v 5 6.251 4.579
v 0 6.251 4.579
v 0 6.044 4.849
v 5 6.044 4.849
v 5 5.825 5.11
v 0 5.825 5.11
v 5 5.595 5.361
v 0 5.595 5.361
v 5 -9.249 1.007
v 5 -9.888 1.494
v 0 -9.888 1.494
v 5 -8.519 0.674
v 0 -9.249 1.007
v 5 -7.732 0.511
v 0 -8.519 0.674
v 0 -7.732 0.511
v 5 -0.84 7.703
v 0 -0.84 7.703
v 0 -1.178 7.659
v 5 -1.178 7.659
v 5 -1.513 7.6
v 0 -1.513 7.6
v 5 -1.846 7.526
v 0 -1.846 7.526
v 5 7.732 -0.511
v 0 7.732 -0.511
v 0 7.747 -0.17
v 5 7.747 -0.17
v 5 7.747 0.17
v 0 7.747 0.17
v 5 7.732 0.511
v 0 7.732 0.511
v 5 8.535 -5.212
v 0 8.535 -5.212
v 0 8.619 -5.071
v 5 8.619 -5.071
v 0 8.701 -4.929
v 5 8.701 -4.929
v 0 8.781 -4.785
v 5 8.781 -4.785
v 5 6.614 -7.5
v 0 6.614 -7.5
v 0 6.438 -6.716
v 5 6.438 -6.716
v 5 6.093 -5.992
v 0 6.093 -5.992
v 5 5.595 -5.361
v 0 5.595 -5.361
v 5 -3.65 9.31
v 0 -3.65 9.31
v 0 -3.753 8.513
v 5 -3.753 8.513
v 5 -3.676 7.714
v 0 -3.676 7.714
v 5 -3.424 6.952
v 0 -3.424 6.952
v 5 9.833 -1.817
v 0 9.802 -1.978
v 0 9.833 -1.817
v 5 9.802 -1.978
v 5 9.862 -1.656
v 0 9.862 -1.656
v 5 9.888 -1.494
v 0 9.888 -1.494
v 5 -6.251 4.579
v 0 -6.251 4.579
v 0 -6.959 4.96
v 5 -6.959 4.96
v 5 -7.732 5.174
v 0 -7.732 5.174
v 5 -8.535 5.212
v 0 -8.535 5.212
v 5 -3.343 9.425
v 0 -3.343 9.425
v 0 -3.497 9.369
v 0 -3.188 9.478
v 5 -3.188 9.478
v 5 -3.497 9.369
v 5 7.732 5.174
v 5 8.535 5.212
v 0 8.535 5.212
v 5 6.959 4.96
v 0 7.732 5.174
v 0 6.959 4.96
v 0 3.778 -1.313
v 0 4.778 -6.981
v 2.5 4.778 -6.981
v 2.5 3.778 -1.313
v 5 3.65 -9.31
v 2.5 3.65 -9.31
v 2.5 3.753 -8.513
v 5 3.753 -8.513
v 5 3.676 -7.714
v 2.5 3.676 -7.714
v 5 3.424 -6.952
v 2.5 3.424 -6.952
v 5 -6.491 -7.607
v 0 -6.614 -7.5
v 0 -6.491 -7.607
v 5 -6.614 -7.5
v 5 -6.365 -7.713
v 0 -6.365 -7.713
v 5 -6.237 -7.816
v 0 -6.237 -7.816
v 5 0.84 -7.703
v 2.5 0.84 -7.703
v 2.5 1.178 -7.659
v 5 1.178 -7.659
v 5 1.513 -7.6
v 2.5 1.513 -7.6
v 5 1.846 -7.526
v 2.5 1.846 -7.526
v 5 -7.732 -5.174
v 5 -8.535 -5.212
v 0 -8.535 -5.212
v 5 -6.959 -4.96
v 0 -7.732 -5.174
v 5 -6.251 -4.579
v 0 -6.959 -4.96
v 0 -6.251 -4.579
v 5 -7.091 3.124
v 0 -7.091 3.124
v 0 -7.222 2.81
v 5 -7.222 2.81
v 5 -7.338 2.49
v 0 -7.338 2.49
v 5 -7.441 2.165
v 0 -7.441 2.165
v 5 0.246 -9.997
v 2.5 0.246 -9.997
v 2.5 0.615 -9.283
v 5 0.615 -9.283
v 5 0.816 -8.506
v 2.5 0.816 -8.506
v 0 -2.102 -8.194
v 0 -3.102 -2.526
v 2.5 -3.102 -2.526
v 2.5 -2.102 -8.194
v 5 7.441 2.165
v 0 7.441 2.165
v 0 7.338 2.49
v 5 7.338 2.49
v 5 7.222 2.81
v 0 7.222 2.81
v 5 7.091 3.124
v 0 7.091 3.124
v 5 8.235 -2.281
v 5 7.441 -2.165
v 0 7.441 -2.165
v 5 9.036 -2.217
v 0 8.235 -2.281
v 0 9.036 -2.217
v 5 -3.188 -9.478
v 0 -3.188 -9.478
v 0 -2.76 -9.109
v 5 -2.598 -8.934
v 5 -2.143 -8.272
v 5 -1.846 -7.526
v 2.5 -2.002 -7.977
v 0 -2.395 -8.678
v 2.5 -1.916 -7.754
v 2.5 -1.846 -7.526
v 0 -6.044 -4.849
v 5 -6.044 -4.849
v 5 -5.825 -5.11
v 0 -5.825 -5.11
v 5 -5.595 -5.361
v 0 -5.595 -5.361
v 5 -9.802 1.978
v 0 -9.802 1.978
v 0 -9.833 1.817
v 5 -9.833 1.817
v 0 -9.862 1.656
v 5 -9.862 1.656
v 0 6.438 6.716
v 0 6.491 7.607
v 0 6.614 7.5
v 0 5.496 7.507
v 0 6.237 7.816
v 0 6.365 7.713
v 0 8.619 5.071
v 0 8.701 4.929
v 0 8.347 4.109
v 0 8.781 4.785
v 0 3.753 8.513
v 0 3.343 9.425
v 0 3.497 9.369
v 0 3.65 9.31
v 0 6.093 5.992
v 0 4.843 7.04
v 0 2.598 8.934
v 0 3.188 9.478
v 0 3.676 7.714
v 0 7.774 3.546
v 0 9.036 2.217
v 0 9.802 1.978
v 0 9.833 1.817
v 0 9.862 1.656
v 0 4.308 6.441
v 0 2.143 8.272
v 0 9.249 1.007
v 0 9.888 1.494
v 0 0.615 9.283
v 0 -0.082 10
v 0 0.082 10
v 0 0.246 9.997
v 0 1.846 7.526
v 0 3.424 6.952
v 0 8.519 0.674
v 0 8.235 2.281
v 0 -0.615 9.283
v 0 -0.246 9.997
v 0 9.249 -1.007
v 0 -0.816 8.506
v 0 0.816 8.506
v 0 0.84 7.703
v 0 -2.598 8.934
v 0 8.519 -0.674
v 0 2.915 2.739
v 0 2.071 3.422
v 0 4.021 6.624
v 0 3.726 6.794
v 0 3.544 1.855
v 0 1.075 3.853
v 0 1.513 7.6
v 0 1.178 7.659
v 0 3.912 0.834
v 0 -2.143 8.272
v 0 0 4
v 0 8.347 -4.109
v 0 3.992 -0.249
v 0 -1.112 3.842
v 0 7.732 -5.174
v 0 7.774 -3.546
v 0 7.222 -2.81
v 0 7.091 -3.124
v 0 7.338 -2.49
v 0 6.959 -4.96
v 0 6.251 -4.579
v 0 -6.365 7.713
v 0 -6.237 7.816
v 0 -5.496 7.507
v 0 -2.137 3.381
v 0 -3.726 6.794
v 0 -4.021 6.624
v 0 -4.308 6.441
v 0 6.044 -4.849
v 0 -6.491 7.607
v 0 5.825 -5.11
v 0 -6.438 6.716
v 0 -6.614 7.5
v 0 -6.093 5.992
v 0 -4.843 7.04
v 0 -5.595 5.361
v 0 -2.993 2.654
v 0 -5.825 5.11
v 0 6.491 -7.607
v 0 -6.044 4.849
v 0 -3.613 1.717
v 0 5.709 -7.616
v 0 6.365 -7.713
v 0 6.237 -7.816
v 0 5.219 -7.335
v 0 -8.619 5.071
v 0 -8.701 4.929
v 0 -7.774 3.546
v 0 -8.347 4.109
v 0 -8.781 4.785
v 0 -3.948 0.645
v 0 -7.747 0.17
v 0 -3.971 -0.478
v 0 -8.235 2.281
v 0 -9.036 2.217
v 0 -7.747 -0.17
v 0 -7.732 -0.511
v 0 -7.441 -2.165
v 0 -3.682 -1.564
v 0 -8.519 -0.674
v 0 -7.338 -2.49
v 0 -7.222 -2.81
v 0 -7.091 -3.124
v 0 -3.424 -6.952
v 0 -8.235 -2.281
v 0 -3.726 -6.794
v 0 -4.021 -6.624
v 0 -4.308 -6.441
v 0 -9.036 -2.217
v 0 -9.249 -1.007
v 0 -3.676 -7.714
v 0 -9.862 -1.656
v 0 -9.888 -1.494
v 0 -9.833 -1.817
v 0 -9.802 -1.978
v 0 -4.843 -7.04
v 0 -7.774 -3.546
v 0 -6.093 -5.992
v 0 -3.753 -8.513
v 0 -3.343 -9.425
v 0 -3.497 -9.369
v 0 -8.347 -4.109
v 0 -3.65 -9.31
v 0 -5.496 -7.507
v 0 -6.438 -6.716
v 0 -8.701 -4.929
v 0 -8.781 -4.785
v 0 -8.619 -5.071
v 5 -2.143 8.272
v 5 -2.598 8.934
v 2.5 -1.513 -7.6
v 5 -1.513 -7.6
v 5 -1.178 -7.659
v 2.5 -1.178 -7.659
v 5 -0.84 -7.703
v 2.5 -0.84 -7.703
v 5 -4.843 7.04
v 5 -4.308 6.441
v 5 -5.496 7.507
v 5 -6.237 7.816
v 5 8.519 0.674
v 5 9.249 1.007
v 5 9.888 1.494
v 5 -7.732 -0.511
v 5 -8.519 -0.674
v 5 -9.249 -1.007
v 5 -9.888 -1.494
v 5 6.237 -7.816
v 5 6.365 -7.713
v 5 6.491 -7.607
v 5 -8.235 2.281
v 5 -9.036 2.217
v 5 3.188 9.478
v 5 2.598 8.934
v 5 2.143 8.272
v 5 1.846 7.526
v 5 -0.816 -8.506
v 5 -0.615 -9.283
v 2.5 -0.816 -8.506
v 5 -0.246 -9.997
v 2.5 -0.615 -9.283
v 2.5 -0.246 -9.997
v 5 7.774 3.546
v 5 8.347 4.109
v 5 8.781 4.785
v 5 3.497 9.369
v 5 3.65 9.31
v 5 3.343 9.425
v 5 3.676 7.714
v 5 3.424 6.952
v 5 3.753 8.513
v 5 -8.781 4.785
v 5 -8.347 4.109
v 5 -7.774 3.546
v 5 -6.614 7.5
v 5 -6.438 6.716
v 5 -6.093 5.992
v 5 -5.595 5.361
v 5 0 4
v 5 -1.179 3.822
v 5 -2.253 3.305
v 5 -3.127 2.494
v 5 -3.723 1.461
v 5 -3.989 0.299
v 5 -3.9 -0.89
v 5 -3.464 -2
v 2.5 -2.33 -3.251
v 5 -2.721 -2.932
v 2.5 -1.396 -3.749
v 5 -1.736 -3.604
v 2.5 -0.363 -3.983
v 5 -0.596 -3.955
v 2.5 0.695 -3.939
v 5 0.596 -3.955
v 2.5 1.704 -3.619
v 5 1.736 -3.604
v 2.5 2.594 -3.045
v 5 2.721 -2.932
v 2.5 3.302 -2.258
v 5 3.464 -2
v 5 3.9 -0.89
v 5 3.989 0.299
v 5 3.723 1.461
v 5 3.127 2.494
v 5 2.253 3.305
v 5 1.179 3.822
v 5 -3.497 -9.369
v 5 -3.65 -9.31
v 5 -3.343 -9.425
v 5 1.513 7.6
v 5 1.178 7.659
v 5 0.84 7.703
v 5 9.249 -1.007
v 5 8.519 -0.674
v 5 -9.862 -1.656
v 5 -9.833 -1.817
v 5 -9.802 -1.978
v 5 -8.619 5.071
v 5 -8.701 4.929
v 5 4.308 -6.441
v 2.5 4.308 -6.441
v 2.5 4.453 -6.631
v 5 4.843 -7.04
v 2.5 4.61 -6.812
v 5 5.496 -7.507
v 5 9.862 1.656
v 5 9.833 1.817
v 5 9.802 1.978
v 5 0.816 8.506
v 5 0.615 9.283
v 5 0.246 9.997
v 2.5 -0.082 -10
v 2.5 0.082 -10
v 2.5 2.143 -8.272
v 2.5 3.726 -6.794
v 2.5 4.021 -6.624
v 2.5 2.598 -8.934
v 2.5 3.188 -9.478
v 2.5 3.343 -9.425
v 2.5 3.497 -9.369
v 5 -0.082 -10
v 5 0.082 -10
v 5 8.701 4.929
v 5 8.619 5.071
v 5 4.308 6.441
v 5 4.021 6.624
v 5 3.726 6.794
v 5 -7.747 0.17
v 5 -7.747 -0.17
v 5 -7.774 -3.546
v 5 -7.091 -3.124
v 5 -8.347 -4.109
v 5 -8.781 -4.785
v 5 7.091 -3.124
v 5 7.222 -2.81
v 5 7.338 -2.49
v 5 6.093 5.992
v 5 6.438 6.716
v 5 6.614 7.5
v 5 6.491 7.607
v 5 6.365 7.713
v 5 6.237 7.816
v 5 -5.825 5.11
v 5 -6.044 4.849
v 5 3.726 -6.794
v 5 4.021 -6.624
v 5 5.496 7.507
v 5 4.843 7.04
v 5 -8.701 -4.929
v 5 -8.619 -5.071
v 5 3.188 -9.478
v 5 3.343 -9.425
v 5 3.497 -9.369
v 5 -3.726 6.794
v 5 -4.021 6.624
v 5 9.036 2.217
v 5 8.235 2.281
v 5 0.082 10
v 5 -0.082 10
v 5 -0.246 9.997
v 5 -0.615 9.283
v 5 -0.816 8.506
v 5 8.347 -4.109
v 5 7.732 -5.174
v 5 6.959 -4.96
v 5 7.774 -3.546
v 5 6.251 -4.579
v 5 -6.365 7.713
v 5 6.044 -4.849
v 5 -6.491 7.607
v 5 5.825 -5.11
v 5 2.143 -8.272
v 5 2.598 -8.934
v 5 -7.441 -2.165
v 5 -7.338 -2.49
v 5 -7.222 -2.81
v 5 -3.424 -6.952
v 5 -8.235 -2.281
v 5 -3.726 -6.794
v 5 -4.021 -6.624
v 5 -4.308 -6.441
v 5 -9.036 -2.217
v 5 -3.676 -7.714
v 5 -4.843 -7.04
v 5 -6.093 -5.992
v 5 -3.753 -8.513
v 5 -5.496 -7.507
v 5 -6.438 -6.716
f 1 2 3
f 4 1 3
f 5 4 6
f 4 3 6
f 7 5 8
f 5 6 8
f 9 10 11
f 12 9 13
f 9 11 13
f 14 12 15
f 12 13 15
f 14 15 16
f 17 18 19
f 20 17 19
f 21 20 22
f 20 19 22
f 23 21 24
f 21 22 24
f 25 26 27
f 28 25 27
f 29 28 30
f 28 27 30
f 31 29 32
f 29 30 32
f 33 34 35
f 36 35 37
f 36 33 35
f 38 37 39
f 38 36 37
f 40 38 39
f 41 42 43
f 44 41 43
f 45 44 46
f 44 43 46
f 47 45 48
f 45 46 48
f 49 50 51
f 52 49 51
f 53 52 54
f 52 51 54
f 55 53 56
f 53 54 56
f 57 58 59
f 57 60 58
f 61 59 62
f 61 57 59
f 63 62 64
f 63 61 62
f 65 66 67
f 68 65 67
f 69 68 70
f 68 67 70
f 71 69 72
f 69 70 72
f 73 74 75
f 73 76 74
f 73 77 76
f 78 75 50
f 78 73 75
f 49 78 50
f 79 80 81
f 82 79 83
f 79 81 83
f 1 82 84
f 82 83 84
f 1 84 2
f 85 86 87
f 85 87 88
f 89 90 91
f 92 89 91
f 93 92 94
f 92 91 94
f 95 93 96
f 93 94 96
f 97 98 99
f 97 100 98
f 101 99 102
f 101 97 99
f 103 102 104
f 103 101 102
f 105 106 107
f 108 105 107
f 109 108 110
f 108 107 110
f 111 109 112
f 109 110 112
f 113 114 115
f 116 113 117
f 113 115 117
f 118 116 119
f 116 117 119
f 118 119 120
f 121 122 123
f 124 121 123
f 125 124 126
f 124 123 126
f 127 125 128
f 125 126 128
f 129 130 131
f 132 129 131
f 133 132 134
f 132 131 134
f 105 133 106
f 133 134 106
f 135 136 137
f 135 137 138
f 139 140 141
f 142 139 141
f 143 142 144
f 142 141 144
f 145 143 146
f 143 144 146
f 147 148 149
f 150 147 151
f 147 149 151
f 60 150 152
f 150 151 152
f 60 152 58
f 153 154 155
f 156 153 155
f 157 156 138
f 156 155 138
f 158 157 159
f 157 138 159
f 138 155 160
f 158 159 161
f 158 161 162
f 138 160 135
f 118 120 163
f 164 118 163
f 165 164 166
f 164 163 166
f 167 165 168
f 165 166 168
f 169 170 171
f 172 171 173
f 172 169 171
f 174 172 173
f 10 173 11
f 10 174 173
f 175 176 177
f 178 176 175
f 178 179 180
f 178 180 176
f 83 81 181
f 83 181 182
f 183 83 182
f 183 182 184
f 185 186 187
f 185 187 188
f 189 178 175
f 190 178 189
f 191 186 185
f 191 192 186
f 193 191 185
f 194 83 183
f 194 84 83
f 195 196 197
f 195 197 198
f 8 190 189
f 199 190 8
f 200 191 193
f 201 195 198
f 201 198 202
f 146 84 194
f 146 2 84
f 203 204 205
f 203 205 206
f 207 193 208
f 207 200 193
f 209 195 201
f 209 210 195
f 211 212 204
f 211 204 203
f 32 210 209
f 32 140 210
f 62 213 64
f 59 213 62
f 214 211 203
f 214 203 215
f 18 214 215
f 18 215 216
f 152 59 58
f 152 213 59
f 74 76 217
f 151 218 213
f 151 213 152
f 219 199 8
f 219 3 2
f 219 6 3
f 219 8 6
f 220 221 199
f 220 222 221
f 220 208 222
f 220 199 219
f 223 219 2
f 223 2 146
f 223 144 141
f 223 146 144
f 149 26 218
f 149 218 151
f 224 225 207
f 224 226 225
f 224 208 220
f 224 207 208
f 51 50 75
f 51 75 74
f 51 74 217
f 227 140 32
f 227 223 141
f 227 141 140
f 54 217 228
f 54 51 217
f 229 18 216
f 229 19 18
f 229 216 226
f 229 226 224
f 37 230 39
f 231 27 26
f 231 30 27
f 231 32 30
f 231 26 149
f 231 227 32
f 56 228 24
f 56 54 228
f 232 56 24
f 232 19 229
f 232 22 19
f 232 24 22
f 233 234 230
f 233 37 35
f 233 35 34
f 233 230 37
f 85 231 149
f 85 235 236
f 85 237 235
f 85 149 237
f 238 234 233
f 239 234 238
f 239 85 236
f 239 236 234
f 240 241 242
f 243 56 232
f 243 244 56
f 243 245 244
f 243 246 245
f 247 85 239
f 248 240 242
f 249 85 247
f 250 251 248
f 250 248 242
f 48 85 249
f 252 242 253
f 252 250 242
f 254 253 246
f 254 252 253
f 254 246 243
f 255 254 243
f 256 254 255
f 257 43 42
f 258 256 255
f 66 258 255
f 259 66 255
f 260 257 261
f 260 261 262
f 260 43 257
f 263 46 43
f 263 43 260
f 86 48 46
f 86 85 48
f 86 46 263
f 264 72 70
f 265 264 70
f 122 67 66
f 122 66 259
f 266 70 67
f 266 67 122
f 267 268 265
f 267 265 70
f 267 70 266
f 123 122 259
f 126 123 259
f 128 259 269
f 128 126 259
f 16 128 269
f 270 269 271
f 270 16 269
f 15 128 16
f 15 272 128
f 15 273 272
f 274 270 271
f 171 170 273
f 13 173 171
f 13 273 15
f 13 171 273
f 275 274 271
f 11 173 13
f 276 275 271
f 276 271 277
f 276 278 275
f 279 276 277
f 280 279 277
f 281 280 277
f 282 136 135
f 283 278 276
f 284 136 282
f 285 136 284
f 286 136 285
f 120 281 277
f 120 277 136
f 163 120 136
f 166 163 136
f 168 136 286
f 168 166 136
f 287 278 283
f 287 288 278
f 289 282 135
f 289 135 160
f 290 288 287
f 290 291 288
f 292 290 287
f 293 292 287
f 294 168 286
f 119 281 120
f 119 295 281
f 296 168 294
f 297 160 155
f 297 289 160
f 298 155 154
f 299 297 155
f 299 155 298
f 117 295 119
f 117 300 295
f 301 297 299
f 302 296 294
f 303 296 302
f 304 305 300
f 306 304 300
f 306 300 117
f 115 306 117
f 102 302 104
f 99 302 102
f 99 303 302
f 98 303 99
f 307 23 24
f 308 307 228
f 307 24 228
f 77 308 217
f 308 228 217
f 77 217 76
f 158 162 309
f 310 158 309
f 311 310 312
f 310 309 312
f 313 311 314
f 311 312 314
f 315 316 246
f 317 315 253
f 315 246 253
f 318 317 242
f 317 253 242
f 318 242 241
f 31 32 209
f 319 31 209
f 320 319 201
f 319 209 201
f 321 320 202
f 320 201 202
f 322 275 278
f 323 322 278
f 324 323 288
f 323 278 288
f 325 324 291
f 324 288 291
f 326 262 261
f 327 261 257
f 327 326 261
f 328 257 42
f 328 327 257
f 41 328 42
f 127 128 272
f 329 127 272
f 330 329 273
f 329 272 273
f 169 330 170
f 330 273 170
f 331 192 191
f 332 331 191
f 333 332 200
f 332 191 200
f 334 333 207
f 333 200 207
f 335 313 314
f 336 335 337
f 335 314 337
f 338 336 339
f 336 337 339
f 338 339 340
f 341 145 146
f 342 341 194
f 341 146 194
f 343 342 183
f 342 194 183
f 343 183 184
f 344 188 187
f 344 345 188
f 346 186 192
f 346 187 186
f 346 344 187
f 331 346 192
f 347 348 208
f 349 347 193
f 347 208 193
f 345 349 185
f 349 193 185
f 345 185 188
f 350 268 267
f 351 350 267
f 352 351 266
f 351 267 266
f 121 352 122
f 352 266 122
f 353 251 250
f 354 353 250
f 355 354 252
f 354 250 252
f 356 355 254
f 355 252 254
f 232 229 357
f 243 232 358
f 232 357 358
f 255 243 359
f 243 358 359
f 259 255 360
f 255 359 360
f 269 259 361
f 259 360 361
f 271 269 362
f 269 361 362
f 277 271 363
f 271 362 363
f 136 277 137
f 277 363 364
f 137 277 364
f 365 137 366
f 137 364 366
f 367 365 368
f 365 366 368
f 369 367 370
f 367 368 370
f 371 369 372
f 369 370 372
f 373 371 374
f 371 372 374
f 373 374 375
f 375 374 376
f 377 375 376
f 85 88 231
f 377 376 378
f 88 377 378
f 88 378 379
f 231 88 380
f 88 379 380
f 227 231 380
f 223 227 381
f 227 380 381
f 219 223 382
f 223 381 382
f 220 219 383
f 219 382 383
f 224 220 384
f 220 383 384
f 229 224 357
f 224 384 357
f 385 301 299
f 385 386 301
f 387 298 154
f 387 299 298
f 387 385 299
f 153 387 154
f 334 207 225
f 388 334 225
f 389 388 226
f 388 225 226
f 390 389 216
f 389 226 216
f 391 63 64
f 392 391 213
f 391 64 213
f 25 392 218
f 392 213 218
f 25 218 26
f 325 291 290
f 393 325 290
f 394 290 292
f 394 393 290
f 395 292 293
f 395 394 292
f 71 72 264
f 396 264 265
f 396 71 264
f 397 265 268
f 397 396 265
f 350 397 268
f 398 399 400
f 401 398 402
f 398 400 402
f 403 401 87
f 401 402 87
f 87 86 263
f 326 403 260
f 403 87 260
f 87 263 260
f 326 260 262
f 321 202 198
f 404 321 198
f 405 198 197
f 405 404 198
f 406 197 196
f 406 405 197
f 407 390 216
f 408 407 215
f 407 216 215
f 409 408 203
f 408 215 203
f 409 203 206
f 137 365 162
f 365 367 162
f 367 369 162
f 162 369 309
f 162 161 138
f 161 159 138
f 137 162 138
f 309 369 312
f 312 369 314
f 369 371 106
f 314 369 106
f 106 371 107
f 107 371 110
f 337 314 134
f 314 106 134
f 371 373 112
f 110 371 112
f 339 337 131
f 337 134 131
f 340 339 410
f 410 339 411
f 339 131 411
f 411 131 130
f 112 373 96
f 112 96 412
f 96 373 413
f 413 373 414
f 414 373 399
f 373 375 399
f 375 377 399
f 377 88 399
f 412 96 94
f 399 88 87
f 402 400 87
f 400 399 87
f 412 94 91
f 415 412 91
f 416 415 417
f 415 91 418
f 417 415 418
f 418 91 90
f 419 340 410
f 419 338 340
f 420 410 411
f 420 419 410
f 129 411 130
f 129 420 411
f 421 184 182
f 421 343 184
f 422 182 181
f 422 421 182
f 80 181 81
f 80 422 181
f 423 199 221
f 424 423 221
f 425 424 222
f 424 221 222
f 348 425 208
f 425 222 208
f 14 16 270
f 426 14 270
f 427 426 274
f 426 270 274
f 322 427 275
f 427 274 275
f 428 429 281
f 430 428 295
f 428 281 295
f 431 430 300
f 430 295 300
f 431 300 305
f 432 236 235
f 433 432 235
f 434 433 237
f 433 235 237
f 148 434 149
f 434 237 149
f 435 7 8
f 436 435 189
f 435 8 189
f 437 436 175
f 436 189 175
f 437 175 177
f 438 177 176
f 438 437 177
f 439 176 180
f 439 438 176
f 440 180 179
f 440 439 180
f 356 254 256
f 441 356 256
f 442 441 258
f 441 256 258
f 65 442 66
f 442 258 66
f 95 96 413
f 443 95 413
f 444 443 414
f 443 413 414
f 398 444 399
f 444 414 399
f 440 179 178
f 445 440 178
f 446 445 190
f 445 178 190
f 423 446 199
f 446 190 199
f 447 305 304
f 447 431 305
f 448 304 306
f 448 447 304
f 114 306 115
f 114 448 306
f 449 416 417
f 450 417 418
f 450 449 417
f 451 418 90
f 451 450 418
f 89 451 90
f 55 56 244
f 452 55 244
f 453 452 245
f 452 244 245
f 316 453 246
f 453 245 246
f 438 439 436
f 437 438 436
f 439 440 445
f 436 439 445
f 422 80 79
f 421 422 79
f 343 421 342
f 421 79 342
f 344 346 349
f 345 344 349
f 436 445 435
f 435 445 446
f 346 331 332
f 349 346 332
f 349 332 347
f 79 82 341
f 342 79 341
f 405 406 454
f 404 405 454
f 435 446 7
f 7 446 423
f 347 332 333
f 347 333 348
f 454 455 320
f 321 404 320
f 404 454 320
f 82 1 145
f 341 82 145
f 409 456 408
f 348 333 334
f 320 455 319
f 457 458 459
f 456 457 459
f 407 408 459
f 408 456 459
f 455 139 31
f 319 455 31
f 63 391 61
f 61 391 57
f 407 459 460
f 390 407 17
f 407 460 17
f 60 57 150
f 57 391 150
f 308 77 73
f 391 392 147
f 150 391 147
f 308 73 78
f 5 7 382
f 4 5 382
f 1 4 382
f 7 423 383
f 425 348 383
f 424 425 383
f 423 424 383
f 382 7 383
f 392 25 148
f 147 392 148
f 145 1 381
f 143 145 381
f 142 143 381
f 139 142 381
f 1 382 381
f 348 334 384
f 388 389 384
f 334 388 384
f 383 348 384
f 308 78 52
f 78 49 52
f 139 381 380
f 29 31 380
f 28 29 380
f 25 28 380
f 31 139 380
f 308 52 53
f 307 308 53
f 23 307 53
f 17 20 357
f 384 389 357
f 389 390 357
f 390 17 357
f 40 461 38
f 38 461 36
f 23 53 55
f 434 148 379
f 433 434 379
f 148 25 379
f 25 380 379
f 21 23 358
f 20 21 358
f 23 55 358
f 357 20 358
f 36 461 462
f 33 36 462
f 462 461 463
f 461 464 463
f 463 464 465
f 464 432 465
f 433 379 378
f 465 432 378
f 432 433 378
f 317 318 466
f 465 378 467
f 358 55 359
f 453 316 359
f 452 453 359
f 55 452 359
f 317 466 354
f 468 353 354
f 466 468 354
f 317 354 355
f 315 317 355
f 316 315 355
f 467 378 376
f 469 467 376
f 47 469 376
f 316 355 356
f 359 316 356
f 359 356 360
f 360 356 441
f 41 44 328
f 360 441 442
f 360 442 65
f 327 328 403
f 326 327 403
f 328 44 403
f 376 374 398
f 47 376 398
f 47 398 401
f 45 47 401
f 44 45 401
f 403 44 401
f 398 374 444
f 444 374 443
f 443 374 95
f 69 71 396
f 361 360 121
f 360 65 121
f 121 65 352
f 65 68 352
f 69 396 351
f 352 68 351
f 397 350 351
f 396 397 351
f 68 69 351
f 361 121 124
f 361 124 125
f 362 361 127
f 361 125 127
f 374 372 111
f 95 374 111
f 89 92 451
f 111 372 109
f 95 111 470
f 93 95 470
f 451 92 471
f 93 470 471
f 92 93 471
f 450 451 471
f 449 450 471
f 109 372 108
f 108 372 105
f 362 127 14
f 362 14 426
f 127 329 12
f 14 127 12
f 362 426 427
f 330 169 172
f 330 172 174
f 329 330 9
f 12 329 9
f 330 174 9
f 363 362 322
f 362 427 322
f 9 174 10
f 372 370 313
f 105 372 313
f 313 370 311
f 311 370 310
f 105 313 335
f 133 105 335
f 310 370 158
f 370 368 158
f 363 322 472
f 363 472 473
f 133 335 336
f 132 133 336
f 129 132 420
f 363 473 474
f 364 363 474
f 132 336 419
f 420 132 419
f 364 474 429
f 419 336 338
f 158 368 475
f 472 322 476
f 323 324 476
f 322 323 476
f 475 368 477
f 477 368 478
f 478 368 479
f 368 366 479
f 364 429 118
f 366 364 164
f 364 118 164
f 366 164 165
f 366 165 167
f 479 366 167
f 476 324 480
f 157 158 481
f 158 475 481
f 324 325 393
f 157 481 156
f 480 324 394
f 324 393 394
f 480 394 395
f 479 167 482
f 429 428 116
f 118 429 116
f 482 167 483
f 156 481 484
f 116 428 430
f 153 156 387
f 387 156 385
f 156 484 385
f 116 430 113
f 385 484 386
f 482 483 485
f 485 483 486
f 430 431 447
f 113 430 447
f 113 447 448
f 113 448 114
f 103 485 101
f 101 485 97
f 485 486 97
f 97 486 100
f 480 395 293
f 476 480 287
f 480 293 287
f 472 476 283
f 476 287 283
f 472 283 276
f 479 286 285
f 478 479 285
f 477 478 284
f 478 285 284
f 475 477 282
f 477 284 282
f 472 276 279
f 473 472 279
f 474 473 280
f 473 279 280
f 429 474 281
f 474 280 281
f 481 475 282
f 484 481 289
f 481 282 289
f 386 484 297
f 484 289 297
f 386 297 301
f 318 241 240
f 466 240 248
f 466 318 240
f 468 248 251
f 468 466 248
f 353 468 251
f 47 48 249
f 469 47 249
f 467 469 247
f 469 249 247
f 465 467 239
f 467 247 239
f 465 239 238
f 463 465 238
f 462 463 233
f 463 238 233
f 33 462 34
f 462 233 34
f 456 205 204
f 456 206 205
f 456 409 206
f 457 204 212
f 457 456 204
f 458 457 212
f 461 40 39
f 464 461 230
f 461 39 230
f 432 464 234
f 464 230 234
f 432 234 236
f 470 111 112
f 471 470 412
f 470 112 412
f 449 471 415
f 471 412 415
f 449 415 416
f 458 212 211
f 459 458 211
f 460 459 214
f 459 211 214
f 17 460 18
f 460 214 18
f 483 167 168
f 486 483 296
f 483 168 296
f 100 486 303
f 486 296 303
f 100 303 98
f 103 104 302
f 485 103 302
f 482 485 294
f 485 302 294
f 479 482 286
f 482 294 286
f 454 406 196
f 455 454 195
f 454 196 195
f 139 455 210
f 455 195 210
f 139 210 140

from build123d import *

# Parameters (mm, degrees)
BASPROSKE_W         = 5
BASPROSKE_H         = 10
TOOTHCUT_DEPTH      = 16
TEETHCUTS_COUNT     = 18
TEETHCUTS_ANGLE     = 340
BORSKE_R            = 4
BORE_DEPTH          = 50.0000508
CUT_EXTRUDE_1_DEPTH = 2.5


with BuildPart() as part:
    # BasProSke → Base-Revolve (revolve)
    with BuildSketch(Plane(origin=(0, 0, 0), x_dir=(1, 0, 0), z_dir=(0, 1, 0)), mode=Mode.PRIVATE) as base_revolve_sk:
        with Locations((2.5, 5)):
            Rectangle(BASPROSKE_W, BASPROSKE_H)
    revolve(base_revolve_sk.sketch.rotate(Axis((-10, 0, 0), (1, 0, 0)), 180), axis=Axis((-10, 0, 0), (1, 0, 0)))

    # TooCutSke → ToothCut (cut, through all)
    with BuildSketch(Plane(origin=(0, 0, 0), x_dir=(0, 0, -1), z_dir=(1, 0, 0))):
        with BuildLine():
            ThreePointArc((0.510641536, 7.732156635), (0, 7.749), (-0.510641536, 7.732156635))
            ThreePointArc((-0.510641536, 7.732156635), (-0.82619259, 8.907320741), (-1.515208602, 9.910236529))
            ThreePointArc((-1.515208602, 9.910236529), (0, 10.0254), (1.515208602, 9.910236529))
            ThreePointArc((1.515208602, 9.910236529), (0.82619259, 8.907320741), (0.510641536, 7.732156635))
        make_face()
    toothcut = extrude(amount=TOOTHCUT_DEPTH, mode=Mode.SUBTRACT)

    # TeethCuts: ToothCut ×18 about axis
    teethcuts_axis = Axis((-10, 0, 0), (1, 0, 0))
    for i in range(1, TEETHCUTS_COUNT):
        add(toothcut.rotate(teethcuts_axis, i * TEETHCUTS_ANGLE / (TEETHCUTS_COUNT - 1)), mode=Mode.SUBTRACT)

    # BorSke → Bore (cut, symmetric)
    with BuildSketch(Plane(origin=(0, 0, 0), x_dir=(0, 0, -1), z_dir=(1, 0, 0))):
        with Locations(Location((0, 0, 0), (0, 0, 180))):
            Circle(BORSKE_R)
    extrude(amount=BORE_DEPTH, both=True, mode=Mode.SUBTRACT)

    # 草图2 → 切除-拉伸1 (cut)
    with BuildSketch(Plane.ZY):
        Polygon((0.391153716, 3.478074003), (-0.822007108, -3.402102925), (-15.361721341, -0.838359014), (-14.148560516, 6.041817914), align=None)
    extrude(amount=-CUT_EXTRUDE_1_DEPTH, mode=Mode.SUBTRACT)


solid = part.part
